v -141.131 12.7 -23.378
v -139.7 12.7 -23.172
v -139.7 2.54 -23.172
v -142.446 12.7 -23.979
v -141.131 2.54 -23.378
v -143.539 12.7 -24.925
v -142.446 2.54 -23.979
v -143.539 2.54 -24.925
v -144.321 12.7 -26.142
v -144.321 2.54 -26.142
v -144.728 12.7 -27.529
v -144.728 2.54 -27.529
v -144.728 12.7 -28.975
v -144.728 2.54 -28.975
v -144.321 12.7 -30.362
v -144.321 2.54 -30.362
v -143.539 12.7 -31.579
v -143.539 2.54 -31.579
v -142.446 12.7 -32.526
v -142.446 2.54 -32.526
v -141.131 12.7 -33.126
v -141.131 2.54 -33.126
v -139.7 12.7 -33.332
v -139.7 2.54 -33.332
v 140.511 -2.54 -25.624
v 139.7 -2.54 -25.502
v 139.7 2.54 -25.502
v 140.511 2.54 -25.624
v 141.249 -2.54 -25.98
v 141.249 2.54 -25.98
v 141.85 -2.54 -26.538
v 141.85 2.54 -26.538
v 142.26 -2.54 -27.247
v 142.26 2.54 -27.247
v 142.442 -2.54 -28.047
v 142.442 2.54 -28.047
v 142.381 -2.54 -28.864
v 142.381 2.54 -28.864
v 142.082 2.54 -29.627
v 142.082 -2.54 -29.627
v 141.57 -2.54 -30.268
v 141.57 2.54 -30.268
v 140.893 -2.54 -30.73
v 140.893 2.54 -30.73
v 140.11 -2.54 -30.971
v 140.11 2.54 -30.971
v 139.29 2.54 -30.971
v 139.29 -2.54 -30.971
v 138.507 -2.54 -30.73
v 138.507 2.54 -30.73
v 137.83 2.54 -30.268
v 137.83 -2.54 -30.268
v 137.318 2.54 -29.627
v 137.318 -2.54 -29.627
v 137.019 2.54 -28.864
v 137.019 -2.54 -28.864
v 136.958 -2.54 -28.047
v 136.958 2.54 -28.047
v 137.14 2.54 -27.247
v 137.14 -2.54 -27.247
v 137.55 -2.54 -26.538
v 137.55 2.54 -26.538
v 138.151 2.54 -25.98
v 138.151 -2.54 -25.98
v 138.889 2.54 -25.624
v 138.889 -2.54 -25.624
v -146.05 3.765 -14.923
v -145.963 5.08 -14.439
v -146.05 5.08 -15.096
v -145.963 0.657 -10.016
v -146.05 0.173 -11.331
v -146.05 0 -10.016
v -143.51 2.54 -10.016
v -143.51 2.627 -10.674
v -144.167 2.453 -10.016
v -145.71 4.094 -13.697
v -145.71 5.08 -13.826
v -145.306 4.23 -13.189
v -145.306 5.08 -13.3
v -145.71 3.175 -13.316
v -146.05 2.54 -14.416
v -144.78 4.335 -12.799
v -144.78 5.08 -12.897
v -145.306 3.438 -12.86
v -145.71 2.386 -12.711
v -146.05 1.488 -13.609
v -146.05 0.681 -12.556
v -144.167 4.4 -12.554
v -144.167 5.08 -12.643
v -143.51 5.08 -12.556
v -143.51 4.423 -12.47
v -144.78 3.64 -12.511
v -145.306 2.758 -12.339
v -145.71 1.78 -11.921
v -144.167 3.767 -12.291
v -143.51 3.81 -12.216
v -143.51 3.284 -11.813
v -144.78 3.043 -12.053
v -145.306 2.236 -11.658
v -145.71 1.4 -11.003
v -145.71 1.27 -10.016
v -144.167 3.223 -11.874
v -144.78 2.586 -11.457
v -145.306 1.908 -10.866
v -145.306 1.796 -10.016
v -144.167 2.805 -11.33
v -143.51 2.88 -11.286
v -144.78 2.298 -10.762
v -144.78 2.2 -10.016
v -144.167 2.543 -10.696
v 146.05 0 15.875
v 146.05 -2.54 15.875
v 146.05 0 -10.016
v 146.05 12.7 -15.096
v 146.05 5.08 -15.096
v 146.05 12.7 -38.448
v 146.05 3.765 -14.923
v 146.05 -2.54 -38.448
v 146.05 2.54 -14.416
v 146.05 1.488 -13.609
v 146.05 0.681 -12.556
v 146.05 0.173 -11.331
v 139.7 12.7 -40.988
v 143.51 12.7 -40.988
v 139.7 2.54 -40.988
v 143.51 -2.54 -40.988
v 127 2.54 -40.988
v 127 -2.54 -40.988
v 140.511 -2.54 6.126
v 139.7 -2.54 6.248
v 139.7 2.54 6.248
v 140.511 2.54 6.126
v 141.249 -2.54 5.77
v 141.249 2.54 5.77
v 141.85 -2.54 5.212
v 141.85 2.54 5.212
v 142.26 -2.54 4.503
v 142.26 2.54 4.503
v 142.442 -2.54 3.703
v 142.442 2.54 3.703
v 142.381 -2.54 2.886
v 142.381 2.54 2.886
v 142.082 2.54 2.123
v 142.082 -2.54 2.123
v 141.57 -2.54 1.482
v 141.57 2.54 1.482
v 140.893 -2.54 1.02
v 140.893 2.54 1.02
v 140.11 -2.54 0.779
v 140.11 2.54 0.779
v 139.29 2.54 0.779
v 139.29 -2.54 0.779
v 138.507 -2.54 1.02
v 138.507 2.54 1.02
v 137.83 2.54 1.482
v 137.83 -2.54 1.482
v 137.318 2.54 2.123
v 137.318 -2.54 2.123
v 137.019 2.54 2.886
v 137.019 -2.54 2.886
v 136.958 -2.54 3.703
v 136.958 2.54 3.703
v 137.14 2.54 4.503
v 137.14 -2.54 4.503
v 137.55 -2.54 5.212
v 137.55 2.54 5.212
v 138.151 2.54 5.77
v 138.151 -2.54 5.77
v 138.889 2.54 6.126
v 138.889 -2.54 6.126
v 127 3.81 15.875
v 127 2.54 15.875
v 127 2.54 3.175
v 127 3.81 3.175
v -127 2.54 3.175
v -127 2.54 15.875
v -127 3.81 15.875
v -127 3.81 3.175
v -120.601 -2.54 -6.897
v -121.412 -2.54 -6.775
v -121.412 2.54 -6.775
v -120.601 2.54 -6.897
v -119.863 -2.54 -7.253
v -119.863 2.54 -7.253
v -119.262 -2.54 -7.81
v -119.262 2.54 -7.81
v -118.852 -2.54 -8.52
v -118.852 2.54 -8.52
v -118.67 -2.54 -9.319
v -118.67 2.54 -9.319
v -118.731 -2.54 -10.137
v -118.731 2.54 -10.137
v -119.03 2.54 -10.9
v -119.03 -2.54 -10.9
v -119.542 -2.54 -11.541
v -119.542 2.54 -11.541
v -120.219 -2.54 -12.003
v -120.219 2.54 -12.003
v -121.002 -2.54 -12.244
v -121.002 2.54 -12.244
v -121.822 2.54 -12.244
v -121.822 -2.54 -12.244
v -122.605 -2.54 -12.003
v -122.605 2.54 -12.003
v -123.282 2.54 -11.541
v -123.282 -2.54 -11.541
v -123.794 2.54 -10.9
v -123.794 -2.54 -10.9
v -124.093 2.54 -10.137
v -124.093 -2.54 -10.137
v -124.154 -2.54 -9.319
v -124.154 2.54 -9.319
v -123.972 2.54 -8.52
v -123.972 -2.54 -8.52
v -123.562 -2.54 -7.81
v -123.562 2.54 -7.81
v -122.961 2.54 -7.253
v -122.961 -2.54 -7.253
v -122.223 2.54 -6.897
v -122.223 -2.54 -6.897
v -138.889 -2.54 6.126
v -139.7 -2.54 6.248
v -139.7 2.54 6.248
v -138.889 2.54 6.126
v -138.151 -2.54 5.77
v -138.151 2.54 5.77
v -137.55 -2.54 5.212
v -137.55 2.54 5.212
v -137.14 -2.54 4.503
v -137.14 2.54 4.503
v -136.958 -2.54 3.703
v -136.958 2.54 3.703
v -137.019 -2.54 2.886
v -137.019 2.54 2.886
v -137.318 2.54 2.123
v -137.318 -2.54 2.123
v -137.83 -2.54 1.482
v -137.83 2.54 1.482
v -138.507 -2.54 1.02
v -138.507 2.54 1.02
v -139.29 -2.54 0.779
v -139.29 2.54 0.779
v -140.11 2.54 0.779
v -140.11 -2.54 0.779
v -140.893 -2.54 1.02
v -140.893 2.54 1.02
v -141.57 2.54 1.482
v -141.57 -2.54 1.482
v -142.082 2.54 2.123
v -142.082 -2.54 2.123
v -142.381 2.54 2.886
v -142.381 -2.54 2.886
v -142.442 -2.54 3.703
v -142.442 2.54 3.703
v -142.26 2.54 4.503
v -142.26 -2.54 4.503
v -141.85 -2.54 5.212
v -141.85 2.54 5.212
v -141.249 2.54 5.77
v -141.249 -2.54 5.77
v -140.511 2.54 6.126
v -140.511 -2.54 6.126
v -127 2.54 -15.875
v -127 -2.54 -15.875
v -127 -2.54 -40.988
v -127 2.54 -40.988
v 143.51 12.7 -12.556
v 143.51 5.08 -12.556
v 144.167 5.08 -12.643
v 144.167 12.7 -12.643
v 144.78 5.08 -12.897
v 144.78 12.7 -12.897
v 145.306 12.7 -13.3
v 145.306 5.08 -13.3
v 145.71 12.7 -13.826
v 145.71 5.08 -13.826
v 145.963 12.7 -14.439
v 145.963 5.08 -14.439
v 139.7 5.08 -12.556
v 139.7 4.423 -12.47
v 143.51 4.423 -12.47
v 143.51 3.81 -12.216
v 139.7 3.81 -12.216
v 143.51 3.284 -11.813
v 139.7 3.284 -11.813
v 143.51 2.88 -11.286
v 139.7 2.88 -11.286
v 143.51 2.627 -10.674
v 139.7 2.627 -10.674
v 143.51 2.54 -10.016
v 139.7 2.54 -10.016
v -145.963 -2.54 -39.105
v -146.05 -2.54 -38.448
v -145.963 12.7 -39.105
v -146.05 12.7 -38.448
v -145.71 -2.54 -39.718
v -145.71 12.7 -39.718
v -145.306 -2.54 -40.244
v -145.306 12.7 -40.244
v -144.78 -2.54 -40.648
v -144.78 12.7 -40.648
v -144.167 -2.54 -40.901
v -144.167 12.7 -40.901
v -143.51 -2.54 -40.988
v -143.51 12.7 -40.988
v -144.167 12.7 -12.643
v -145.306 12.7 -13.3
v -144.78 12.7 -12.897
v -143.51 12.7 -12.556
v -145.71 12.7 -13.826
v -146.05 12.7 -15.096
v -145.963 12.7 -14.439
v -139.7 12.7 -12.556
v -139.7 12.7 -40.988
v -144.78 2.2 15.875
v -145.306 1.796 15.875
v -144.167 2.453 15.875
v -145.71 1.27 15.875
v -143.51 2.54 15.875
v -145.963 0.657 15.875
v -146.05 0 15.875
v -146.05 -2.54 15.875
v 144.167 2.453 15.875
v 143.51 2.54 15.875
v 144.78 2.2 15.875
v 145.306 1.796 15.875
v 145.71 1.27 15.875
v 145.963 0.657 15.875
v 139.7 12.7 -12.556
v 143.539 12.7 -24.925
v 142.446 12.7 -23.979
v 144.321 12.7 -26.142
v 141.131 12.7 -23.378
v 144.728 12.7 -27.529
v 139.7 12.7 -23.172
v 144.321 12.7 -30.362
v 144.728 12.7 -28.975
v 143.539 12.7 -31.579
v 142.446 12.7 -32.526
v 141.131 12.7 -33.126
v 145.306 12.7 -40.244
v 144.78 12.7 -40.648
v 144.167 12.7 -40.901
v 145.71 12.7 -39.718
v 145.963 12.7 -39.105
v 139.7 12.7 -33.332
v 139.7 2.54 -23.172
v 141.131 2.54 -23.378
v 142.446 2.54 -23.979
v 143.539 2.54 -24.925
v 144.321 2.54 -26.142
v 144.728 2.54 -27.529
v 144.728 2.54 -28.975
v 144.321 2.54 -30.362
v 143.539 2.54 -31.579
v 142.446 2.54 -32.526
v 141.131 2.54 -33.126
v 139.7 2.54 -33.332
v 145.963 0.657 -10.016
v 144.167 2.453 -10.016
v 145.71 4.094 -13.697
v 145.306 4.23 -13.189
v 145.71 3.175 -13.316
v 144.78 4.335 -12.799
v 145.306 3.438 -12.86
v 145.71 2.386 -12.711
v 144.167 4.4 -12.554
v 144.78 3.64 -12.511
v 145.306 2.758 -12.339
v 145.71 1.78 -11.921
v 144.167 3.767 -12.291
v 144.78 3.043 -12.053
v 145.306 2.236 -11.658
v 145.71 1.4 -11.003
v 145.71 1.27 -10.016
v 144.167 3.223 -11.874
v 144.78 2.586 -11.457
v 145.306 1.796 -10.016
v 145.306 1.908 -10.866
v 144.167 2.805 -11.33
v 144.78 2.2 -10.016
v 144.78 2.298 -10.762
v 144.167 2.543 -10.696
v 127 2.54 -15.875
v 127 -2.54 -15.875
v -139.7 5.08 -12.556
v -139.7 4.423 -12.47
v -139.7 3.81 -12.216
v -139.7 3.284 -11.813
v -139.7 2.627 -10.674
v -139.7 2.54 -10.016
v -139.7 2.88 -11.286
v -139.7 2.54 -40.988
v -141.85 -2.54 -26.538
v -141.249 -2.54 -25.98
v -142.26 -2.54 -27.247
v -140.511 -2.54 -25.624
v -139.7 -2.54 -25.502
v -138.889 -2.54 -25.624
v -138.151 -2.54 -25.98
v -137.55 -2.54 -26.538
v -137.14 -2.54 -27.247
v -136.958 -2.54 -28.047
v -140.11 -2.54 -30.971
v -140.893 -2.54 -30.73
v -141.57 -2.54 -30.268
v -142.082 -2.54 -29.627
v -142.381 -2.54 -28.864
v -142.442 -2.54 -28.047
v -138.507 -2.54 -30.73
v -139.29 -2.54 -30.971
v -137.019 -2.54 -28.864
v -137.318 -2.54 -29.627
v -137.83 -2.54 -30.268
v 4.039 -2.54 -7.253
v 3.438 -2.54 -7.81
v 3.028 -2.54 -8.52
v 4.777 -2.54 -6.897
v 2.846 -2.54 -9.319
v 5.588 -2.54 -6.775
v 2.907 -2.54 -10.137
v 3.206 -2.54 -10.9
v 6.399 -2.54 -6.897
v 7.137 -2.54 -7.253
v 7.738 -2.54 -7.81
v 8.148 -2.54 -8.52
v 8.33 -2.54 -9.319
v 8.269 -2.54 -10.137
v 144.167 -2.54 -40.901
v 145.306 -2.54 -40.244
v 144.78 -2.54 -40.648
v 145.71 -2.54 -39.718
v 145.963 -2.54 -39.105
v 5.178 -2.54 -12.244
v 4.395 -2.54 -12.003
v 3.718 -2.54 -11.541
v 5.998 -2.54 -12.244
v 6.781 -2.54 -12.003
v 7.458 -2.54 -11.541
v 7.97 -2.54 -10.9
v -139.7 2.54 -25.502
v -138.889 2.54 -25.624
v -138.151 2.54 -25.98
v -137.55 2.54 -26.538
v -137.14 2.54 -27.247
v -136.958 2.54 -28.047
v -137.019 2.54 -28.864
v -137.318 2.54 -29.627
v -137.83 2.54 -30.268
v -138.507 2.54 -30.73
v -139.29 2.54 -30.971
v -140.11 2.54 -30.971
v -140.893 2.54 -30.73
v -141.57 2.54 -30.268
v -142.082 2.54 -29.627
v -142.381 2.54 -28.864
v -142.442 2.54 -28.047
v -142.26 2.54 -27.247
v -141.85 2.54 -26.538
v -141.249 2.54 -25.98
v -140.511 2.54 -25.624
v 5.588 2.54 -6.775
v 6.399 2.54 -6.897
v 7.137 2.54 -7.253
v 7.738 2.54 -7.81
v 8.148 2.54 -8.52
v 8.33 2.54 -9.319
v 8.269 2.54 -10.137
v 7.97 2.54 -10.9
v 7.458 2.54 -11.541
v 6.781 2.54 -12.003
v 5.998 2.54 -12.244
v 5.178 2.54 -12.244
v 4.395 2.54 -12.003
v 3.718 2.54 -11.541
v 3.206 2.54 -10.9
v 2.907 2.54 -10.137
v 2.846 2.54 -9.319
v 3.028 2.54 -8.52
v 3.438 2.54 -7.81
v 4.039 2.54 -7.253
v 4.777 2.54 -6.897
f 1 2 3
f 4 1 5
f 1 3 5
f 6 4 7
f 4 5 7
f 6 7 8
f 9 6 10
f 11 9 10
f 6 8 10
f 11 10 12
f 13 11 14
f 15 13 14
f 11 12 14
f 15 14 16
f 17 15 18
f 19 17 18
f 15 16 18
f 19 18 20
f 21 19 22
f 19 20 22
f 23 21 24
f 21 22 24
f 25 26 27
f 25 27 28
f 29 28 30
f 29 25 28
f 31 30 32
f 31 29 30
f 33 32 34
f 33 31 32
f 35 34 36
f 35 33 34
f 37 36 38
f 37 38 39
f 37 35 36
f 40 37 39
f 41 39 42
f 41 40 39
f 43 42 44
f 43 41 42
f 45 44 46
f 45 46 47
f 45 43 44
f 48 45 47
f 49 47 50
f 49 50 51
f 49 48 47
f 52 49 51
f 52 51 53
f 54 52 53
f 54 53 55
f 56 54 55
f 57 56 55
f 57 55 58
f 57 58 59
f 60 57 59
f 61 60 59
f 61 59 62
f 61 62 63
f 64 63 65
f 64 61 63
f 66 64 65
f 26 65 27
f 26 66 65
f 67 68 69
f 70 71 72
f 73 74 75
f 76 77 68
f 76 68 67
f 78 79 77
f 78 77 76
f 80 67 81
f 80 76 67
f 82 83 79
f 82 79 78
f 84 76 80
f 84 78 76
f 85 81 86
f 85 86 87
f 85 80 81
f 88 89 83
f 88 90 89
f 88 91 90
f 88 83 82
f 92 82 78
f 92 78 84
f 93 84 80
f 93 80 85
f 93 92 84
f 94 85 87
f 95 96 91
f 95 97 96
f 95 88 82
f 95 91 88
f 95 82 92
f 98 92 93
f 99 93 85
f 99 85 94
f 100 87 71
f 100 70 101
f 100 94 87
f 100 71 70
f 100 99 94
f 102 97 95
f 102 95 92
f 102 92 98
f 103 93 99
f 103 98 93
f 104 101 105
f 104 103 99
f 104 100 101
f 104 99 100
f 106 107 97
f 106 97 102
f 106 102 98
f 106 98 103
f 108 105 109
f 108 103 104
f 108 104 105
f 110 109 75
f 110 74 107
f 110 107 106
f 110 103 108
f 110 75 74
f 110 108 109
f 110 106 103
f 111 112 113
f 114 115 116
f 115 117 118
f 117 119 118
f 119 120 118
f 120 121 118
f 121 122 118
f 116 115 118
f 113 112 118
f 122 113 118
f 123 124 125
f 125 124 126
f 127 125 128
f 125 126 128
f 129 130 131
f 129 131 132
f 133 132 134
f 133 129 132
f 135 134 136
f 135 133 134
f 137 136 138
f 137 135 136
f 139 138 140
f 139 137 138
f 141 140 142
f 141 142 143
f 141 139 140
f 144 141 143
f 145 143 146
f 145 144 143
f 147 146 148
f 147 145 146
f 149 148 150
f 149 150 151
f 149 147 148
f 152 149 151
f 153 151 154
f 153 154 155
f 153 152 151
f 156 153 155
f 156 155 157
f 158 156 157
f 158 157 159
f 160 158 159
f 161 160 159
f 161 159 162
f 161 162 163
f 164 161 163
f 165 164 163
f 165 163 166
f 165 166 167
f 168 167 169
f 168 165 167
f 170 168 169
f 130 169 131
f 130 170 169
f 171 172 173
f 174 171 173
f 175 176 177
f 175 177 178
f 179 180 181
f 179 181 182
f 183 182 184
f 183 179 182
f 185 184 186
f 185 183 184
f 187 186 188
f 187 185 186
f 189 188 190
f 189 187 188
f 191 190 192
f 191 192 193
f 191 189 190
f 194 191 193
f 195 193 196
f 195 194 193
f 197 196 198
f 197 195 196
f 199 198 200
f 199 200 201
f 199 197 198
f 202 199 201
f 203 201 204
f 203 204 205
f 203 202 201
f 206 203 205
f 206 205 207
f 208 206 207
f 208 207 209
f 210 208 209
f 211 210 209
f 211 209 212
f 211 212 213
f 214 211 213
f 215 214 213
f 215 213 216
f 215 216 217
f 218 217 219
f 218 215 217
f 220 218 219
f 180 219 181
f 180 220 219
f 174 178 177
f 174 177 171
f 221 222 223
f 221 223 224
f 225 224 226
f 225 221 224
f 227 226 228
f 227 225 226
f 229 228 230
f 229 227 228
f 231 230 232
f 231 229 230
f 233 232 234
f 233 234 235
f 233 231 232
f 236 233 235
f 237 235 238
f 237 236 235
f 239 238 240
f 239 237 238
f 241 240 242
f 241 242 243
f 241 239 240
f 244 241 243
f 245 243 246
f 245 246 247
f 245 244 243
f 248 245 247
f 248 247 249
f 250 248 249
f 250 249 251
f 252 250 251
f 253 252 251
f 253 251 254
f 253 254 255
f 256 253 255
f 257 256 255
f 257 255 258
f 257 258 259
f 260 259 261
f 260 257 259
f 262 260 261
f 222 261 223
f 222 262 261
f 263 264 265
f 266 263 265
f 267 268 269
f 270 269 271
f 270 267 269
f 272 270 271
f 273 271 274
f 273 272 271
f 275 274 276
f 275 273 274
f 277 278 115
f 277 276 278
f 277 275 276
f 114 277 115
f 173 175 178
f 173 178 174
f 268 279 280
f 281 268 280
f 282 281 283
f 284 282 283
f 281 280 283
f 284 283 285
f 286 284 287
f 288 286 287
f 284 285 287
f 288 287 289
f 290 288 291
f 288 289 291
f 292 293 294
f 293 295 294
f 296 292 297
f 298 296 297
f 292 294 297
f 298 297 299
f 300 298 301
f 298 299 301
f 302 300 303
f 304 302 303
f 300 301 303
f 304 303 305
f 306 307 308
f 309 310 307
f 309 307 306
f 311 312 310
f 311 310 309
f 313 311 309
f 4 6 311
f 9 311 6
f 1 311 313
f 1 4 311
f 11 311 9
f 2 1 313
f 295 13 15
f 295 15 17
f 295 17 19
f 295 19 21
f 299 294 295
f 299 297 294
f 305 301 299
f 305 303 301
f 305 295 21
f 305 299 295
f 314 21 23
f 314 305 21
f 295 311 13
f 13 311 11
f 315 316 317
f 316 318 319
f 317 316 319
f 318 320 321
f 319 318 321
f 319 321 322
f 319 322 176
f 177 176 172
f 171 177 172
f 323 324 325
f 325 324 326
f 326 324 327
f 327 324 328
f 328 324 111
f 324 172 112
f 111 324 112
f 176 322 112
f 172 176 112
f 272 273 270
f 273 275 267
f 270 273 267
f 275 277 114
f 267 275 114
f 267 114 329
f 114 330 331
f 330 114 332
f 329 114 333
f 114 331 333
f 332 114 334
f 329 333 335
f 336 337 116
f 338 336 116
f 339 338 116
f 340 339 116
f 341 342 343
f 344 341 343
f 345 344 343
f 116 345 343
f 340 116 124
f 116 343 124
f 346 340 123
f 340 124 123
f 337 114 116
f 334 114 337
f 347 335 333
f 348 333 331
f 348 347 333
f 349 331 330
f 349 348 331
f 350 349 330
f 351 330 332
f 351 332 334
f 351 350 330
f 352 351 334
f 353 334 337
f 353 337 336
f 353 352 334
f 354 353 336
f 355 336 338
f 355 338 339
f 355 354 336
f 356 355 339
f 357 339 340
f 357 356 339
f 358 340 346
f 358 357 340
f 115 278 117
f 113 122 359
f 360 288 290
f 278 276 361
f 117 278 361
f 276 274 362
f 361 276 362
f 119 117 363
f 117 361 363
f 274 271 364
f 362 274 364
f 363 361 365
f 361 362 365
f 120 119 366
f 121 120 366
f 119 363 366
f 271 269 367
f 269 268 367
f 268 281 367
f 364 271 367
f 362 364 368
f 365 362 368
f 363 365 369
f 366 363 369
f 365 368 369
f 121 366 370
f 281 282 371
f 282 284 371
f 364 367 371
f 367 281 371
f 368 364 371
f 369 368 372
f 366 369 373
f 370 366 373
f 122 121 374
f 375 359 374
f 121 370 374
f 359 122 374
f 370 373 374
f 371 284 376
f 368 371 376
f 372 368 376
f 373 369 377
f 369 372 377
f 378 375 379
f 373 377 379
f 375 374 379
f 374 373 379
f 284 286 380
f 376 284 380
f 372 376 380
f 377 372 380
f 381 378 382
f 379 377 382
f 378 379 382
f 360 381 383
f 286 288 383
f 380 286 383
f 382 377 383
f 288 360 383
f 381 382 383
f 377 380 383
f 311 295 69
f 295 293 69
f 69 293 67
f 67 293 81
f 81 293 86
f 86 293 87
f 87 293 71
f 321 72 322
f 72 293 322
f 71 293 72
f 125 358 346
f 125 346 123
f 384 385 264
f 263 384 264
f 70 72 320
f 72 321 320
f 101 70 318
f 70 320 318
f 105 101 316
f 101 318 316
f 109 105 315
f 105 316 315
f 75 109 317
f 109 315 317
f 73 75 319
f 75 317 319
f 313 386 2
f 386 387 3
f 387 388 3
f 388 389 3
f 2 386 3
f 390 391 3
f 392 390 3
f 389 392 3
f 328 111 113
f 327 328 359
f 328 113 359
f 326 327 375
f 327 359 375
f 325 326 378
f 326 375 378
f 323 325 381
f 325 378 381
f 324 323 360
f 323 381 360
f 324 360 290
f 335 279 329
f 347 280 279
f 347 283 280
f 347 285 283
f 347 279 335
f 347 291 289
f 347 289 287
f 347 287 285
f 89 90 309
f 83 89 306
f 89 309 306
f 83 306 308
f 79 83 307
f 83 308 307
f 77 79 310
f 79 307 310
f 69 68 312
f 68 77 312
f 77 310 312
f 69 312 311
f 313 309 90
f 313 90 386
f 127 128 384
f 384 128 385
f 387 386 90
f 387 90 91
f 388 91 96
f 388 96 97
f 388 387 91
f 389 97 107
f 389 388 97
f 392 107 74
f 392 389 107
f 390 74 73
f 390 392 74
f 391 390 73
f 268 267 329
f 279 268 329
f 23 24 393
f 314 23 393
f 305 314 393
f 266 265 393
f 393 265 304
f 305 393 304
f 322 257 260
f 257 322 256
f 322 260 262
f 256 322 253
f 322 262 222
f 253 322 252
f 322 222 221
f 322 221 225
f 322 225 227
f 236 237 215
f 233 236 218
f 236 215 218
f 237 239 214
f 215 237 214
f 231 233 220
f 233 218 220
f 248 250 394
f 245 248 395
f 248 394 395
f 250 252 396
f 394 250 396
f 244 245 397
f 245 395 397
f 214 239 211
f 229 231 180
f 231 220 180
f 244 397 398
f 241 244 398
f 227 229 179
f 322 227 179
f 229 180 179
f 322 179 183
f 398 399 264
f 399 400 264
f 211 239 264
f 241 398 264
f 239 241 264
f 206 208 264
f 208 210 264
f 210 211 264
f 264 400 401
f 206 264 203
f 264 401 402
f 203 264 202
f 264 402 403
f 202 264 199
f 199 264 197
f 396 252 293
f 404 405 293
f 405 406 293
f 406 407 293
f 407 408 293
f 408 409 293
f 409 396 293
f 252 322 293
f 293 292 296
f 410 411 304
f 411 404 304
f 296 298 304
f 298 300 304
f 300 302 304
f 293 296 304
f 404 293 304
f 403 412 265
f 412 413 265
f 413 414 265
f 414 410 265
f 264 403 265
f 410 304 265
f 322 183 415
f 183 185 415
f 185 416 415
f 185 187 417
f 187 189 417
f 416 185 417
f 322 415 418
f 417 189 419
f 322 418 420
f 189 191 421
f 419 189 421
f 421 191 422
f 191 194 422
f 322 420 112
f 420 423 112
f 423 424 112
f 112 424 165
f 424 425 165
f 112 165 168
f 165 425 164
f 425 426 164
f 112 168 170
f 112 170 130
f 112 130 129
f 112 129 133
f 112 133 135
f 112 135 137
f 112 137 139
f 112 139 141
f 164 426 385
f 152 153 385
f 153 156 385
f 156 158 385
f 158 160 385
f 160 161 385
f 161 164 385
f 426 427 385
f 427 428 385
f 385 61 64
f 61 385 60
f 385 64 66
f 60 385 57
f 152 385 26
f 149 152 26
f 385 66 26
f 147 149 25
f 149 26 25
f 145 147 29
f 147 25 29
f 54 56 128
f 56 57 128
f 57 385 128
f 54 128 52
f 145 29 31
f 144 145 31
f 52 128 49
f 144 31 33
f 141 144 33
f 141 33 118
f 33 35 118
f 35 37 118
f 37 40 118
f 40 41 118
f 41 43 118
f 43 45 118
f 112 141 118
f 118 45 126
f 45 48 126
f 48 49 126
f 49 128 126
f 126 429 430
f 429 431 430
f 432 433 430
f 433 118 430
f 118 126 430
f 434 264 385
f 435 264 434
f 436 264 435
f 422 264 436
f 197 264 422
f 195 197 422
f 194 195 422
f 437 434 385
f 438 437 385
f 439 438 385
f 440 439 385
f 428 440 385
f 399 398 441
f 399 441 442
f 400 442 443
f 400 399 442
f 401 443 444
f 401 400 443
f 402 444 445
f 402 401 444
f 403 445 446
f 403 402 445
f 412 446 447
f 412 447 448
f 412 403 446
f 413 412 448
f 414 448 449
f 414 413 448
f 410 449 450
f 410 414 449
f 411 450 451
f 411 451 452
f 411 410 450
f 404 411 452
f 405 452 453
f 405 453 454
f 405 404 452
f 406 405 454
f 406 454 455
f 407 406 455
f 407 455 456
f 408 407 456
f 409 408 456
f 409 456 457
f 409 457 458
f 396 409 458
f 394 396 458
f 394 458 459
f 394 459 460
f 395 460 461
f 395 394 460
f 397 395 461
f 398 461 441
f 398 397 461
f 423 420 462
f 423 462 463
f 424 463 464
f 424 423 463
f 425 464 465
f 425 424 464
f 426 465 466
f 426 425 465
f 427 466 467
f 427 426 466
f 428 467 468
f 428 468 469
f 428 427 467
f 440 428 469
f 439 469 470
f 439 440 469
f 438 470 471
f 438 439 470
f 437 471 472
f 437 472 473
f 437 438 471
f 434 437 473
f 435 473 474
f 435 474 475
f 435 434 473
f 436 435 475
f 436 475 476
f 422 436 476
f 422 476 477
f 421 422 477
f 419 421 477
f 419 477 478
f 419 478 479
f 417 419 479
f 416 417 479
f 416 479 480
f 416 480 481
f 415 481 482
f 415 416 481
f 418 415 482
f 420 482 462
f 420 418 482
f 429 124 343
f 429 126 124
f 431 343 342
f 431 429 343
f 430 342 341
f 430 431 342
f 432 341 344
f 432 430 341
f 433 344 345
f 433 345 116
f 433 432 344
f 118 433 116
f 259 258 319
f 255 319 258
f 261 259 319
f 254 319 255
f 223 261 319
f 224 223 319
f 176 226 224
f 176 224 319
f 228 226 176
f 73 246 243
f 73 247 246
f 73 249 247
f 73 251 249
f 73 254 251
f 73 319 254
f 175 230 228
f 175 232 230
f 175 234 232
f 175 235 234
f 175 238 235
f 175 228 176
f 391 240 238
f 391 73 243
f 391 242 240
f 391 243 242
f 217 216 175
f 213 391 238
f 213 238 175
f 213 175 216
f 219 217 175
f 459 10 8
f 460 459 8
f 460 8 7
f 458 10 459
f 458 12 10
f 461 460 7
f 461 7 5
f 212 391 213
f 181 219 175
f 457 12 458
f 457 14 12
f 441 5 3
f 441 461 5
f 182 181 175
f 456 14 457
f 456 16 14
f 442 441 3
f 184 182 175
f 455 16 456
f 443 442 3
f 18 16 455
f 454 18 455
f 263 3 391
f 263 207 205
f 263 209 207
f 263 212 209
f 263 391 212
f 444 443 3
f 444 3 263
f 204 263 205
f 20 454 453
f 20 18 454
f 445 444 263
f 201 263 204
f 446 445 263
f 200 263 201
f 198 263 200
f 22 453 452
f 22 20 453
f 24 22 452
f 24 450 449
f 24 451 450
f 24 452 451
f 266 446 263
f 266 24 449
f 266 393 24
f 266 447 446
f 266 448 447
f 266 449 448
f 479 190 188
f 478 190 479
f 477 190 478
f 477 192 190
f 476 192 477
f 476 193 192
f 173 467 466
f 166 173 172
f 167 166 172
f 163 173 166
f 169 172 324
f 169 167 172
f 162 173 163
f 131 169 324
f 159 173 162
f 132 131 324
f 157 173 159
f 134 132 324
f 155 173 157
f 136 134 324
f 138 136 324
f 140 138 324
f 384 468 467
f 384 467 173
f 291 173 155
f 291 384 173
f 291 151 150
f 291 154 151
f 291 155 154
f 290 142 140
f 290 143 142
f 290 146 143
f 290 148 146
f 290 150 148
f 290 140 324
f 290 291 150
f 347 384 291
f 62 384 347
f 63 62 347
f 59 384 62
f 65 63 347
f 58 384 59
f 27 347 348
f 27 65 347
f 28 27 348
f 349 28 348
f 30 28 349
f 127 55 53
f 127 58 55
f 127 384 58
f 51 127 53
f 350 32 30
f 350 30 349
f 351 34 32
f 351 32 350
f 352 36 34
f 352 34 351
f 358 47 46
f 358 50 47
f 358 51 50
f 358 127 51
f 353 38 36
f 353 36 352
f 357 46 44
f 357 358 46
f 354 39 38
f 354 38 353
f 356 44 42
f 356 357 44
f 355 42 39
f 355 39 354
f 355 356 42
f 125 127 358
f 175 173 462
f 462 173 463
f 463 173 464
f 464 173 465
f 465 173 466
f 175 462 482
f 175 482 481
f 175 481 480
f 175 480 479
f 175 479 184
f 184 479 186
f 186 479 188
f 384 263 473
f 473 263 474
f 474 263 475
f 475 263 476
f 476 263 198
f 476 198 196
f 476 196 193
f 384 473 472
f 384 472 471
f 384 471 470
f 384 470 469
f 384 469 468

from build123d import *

# Parameters (mm, degrees)
BOSS_EXTRUDE1_DEPTH      = 2.54
BOSS_EXTRUDE1_DEPTH_BACK = 2.54
SKETCH1_R                = 2.75
BOSS_EXTRUDE2_DEPTH      = 10.16
FILLET1_R                = 2.54
SKETCH3_W                = 254
SKETCH3_H                = 12.7
BOSS_EXTRUDE3_DEPTH      = 1.27


with BuildPart() as part:
    # Sketch1 → Boss-Extrude1 (new, two sides: drawn at the far end of the back side and taken through both)
    with BuildSketch(Plane(origin=(0, 0, 0), x_dir=(1, 0, 0), z_dir=(0, 1, 0)).offset(-BOSS_EXTRUDE1_DEPTH_BACK)):
        Polygon((-146.05, -15.875), (146.05, -15.875), (146.05, 40.98799435), (127, 40.98799435), (127, 15.875), (-127, 15.875), (-127, 40.98799435), (-146.05, 40.98799435), align=None)
        with Locations((-139.7, 28.252118644)):
            Circle(SKETCH1_R, mode=Mode.SUBTRACT)
        with Locations((-139.7, -3.497881356)):
            Circle(SKETCH1_R, mode=Mode.SUBTRACT)
        with Locations((5.588, 9.525)):
            Circle(SKETCH1_R, mode=Mode.SUBTRACT)
        with Locations((-121.412, 9.525)):
            Circle(SKETCH1_R, mode=Mode.SUBTRACT)
        with Locations((139.7, 28.252118644)):
            Circle(SKETCH1_R, mode=Mode.SUBTRACT)
        with Locations((139.7, -3.497881356)):
            Circle(SKETCH1_R, mode=Mode.SUBTRACT)
    extrude(amount=BOSS_EXTRUDE1_DEPTH + BOSS_EXTRUDE1_DEPTH_BACK)

    # Sketch2 → Boss-Extrude2 (add)
    with BuildSketch(Plane(origin=(0, 2.54, 0), x_dir=(1, 0, 0), z_dir=(0, 1, 0))):
        with BuildLine():
            Line((-139.7, 33.332118644), (-139.7, 40.98799435))
            Line((-139.7, 40.98799435), (-146.05, 40.98799435))
            Line((-146.05, 40.98799435), (-146.05, 12.556497175))
            Line((-146.05, 12.556497175), (-139.7, 12.556497175))
            Line((-139.7, 12.556497175), (-139.7, 23.172118644))
            ThreePointArc((-139.7, 23.172118644), (-144.78, 28.252118644), (-139.7, 33.332118644))
        make_face()
        with BuildLine():
            Line((146.05, 40.98799435), (146.05, 12.556497175))
            Line((146.05, 12.556497175), (139.7, 12.556497175))
            Line((139.7, 12.556497175), (139.7, 23.172118644))
            ThreePointArc((139.7, 23.172118644), (144.78, 28.252118644), (139.7, 33.332118644))
            Line((139.7, 33.332118644), (139.7, 40.98799435))
            Line((139.7, 40.98799435), (146.05, 40.98799435))
        make_face()
    extrude(amount=BOSS_EXTRUDE2_DEPTH)

    # Fillet1
    fillet1_edges = [part.edges().sort_by_distance(p)[0] for p in [
        (146.05, 7.62, -12.556497175),
        (-146.05, 2.54, 1.659251412),
        (146.05, 5.08, -40.98799435),
        (142.875, 2.54, -12.556497175),
        (146.05, 2.54, 1.659251412),
        (-146.05, 5.08, -40.98799435),
        (-146.05, 7.62, -12.556497175),
        (-142.875, 2.54, -12.556497175),
    ]]
    fillet(fillet1_edges, radius=FILLET1_R)

    # Sketch3 → Boss-Extrude3 (add)
    with BuildSketch(Plane(origin=(0, 2.54, 0), x_dir=(1, 0, 0), z_dir=(0, 1, 0))):
        with Locations((0, -9.525)):
            Rectangle(SKETCH3_W, SKETCH3_H)
    extrude(amount=BOSS_EXTRUDE3_DEPTH)


solid = part.part
